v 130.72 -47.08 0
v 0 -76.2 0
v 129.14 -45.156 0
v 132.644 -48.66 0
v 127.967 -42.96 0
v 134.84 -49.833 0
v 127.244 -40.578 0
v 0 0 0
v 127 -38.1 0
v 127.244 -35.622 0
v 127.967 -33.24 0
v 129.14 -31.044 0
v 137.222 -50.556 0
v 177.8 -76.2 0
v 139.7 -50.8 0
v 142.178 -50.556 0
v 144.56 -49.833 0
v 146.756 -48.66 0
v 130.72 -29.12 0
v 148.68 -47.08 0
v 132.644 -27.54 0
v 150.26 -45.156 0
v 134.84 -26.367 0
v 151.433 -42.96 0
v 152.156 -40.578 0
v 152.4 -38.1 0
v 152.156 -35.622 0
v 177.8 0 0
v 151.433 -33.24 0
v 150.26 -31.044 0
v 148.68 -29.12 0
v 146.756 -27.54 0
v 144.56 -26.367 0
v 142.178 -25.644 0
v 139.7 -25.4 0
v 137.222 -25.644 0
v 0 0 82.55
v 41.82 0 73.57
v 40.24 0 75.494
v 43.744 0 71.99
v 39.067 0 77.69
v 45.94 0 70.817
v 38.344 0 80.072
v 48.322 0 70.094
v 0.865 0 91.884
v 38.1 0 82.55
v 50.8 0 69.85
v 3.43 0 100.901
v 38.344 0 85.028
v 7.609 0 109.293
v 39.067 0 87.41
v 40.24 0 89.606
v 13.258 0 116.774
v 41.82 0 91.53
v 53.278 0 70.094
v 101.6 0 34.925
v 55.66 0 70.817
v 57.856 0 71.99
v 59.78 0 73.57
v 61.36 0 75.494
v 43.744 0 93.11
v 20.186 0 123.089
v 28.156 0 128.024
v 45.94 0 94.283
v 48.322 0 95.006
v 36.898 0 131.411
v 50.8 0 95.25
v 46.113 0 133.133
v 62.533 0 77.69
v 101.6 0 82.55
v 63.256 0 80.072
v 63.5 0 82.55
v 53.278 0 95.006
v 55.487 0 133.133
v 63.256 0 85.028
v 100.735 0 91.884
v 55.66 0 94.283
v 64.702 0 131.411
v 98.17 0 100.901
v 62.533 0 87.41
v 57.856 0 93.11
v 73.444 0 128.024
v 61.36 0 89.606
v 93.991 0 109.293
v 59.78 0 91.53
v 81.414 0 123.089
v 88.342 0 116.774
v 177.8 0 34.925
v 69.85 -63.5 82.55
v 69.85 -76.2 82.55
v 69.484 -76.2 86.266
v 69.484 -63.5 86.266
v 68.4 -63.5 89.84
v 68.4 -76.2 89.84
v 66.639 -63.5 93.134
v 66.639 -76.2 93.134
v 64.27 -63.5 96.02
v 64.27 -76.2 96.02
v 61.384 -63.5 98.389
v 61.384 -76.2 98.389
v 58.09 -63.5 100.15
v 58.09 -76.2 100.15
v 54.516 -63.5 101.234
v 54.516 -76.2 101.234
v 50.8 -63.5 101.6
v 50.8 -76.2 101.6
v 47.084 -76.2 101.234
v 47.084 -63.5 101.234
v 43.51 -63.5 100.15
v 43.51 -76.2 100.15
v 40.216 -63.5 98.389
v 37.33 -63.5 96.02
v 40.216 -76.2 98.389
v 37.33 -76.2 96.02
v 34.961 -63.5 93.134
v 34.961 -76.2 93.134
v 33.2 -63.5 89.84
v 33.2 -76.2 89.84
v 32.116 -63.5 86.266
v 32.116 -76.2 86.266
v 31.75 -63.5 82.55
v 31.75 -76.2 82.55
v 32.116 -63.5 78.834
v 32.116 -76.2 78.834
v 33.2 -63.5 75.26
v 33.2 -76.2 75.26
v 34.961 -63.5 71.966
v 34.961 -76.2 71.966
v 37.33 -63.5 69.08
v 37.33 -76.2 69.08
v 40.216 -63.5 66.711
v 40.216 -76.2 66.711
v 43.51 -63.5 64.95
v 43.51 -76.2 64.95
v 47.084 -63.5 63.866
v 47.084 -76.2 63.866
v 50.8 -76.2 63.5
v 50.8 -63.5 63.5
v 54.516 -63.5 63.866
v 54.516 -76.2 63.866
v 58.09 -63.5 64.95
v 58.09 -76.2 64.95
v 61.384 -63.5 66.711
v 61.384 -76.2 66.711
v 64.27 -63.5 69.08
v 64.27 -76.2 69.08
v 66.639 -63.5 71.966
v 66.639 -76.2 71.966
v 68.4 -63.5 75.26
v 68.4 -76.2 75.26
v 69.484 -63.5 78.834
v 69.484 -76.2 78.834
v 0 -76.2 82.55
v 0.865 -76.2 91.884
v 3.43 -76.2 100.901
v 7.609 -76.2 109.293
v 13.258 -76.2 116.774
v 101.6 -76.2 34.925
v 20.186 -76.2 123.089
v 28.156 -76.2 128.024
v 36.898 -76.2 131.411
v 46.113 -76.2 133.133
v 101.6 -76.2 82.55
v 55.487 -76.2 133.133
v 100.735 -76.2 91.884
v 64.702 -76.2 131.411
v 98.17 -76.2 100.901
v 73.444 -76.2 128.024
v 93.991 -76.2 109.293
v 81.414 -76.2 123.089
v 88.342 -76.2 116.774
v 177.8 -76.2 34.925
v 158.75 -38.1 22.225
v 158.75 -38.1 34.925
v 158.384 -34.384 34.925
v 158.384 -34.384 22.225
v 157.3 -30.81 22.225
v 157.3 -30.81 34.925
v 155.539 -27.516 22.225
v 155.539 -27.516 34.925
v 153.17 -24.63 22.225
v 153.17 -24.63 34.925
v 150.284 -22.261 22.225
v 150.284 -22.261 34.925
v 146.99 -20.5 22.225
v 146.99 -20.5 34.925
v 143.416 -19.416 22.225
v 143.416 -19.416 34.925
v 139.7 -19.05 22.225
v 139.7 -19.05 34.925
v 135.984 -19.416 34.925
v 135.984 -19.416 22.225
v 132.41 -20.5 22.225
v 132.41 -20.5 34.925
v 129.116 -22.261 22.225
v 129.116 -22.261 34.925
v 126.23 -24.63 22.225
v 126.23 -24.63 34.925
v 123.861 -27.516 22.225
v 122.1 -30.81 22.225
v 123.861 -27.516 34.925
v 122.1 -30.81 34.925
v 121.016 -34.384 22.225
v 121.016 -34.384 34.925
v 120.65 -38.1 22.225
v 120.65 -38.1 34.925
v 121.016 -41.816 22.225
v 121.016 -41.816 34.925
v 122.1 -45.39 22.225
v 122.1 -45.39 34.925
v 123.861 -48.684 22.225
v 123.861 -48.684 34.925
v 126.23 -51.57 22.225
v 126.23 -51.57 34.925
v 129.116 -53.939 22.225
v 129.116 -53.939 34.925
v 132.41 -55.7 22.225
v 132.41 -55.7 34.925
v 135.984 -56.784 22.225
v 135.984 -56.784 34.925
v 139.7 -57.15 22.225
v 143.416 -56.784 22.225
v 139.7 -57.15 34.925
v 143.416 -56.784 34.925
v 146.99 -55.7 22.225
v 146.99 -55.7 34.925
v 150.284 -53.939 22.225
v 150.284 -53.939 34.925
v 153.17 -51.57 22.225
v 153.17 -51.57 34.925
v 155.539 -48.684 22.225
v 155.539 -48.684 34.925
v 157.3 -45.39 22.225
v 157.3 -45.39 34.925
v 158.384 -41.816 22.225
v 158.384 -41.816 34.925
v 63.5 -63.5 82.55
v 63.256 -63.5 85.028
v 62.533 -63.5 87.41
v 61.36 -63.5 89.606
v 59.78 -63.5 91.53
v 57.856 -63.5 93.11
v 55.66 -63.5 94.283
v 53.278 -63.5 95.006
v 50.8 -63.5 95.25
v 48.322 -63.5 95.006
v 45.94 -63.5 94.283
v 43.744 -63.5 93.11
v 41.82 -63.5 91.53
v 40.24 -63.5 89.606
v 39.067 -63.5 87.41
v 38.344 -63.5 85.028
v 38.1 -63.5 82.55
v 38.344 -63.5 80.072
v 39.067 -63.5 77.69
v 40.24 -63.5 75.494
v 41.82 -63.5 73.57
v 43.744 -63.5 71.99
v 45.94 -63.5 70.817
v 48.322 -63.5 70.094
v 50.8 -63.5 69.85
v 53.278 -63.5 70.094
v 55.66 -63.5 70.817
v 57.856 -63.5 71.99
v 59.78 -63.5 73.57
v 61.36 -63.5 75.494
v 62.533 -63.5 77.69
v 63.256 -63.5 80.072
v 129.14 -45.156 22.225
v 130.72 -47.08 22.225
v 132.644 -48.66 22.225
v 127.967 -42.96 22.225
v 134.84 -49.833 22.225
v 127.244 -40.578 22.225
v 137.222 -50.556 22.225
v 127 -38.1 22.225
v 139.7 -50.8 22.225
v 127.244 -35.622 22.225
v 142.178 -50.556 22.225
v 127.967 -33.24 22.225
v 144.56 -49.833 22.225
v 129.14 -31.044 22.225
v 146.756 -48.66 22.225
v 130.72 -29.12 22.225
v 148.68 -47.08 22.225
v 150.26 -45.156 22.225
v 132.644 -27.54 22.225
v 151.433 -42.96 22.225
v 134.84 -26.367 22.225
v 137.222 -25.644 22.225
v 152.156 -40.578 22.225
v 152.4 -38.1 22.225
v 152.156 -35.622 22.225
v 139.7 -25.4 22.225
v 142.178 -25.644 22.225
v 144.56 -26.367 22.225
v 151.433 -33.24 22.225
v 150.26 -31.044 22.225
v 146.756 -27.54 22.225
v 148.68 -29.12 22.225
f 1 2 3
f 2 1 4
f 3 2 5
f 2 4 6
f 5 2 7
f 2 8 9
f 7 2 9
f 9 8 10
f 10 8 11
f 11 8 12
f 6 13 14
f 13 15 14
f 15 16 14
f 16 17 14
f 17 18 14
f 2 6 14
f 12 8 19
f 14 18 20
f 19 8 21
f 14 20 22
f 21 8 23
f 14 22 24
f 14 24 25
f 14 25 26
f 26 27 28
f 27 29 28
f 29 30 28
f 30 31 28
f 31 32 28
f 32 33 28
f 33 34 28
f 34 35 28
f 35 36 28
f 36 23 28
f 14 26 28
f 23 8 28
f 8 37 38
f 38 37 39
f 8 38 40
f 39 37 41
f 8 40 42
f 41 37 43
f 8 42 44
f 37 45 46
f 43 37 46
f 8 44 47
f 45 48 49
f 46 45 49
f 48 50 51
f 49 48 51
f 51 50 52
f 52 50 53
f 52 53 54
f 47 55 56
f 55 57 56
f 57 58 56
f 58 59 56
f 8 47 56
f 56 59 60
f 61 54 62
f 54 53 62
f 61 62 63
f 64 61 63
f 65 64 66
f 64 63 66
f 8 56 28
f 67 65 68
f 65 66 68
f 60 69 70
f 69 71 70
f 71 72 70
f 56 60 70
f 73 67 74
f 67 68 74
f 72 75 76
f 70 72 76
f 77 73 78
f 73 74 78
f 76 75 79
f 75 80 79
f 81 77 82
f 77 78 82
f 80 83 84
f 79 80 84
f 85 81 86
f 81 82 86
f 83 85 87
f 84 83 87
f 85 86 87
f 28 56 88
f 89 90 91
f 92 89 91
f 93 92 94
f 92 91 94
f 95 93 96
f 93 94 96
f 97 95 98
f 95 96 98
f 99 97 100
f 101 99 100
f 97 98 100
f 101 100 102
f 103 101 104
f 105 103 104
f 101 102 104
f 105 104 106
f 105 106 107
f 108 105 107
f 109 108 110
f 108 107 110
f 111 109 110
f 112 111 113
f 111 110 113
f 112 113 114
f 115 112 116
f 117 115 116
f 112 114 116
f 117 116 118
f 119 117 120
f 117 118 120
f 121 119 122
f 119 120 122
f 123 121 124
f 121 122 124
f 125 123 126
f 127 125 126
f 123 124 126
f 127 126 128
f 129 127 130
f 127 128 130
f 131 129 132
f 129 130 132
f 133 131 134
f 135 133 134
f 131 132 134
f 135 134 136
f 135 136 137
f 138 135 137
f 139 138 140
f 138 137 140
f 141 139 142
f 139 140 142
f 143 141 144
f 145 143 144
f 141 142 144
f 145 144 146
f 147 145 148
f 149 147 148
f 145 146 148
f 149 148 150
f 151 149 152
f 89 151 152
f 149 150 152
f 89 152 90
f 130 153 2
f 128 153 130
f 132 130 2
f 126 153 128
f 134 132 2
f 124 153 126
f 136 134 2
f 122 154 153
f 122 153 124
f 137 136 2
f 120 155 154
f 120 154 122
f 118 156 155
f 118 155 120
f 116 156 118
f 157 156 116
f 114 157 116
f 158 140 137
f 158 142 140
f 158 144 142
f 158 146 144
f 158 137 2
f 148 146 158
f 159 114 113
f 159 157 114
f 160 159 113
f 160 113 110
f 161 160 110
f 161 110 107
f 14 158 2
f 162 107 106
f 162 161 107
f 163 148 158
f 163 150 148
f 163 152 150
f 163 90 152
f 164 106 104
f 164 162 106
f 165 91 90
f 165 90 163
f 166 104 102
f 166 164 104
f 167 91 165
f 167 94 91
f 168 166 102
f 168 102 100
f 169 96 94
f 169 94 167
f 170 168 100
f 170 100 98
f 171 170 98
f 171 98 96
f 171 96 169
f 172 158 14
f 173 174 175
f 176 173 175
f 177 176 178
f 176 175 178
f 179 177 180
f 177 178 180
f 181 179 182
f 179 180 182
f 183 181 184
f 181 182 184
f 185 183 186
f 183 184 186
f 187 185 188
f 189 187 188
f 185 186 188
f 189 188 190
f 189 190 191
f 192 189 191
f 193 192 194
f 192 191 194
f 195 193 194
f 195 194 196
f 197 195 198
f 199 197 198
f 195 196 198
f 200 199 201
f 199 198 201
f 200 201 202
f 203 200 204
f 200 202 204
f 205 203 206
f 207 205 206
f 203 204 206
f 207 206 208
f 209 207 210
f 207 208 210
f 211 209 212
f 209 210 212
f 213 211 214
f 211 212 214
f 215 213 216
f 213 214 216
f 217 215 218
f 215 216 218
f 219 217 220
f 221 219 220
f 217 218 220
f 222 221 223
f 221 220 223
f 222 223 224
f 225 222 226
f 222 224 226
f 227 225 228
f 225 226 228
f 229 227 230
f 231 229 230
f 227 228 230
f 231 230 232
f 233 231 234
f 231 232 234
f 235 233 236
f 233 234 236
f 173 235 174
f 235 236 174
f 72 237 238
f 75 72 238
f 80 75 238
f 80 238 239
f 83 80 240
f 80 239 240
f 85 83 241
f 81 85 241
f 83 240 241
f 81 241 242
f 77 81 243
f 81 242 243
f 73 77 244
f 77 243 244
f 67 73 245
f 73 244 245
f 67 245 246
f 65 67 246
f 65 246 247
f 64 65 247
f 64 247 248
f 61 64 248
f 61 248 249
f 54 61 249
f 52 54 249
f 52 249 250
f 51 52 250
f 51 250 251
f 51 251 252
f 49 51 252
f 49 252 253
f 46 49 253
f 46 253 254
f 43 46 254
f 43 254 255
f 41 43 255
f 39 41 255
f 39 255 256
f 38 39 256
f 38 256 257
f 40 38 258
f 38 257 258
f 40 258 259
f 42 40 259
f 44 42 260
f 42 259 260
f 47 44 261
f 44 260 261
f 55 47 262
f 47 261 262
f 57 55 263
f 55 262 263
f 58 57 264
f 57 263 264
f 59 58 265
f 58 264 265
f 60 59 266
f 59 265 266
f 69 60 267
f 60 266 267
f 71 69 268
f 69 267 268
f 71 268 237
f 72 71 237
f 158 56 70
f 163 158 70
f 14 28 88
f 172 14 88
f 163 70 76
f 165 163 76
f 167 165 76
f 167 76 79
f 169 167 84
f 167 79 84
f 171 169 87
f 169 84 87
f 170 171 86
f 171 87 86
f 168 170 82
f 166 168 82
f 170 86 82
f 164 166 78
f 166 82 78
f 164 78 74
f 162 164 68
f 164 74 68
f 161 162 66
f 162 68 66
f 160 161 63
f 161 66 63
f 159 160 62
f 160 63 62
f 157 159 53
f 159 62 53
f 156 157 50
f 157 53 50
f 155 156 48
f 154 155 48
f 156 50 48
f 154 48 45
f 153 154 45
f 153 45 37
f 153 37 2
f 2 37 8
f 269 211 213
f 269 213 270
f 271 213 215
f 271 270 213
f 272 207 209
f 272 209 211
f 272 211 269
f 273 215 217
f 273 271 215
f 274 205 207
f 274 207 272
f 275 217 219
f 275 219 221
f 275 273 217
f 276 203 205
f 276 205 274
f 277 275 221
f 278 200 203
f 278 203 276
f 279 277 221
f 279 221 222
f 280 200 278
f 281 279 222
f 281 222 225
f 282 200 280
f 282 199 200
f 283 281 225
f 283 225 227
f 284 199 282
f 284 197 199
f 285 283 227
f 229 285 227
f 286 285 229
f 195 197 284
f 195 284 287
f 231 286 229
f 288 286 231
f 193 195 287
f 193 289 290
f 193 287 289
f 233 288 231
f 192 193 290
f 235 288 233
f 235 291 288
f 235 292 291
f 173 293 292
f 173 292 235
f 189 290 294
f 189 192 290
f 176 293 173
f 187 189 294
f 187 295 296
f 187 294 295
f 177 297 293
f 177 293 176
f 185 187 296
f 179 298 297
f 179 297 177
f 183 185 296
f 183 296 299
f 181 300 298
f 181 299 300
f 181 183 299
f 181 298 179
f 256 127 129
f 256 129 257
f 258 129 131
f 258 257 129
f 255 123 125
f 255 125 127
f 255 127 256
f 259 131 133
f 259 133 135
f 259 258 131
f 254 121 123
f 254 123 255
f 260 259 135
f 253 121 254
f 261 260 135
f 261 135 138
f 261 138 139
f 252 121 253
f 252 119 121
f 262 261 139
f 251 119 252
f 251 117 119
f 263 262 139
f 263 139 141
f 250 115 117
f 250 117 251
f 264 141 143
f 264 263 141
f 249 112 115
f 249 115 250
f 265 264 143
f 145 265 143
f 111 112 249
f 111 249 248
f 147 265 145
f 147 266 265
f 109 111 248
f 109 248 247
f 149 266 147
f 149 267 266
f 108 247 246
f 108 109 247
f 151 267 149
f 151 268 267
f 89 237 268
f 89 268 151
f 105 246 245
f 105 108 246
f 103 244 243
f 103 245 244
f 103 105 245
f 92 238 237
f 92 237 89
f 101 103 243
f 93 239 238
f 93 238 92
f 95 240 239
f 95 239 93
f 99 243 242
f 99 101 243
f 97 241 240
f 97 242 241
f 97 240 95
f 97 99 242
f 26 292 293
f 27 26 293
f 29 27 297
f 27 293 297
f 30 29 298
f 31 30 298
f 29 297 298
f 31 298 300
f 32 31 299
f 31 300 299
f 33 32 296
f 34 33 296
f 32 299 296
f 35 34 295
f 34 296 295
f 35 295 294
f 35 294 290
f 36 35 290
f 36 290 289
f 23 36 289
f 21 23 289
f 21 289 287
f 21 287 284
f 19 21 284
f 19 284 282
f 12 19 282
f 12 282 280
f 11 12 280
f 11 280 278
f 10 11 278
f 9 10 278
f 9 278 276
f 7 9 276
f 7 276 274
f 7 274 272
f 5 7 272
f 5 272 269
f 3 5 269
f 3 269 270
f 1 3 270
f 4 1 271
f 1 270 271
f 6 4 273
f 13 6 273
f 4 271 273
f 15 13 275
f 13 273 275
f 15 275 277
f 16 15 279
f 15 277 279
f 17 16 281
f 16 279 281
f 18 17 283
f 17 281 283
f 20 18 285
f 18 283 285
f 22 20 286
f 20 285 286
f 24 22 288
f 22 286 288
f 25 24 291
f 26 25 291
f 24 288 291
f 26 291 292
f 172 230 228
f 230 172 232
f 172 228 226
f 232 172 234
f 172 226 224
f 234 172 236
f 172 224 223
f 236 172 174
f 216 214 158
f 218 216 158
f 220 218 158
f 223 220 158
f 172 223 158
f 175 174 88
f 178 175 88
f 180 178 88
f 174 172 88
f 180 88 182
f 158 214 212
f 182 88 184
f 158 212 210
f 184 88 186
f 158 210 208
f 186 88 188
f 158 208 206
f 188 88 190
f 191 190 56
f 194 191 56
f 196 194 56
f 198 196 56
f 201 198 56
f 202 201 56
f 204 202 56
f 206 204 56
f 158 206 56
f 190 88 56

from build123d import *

# Parameters (mm, degrees)
F1_DEPTH = 76.2
F2_R     = 19.05
F3_DEPTH = 12.7
F4_R     = 12.7
F5_DEPTH = 76.201
F6_R     = 19.05
F7_DEPTH = 12.7
F8_R     = 12.7
F9_DEPTH = 34.926


with BuildPart() as f1:
    # F0 (on Front) → F1 (new body)
    with BuildSketch(Plane.XZ):
        with BuildLine():
            Line((0, 82.55), (0, 0))
            Line((0, 0), (177.8, 0))
            Line((177.8, 0), (177.8, 34.925))
            Line((177.8, 34.925), (101.6, 34.925))
            Line((101.6, 34.925), (101.6, 82.55))
            ThreePointArc((101.6, 82.55), (50.8, 133.35), (0, 82.55))
        make_face()
    extrude(amount=F1_DEPTH)

    # F2 (on face) → F3 (cut)
    with BuildSketch(Plane.XZ.offset(76.2)):
        with Locations((50.8, 82.55)):
            Circle(F2_R)
    extrude(amount=-F3_DEPTH, mode=Mode.SUBTRACT)

    # F4 (on face) → F5 (cut, through all)
    with BuildSketch(Plane.XZ.offset(76.2)):
        with Locations((50.8, 82.55)):
            Circle(F4_R)
    extrude(amount=-F5_DEPTH, mode=Mode.SUBTRACT)

    # F6 (on face) → F7 (cut)
    with BuildSketch(Plane.XY.offset(34.925)):
        with Locations((139.7, -38.1)):
            Circle(F6_R)
    extrude(amount=-F7_DEPTH, mode=Mode.SUBTRACT)

    # F8 (on face) → F9 (cut, through all)
    with BuildSketch(Plane.XY.offset(34.925)):
        with Locations((139.7, -38.1)):
            Circle(F8_R)
    extrude(amount=-F9_DEPTH, mode=Mode.SUBTRACT)


solid = f1.part
